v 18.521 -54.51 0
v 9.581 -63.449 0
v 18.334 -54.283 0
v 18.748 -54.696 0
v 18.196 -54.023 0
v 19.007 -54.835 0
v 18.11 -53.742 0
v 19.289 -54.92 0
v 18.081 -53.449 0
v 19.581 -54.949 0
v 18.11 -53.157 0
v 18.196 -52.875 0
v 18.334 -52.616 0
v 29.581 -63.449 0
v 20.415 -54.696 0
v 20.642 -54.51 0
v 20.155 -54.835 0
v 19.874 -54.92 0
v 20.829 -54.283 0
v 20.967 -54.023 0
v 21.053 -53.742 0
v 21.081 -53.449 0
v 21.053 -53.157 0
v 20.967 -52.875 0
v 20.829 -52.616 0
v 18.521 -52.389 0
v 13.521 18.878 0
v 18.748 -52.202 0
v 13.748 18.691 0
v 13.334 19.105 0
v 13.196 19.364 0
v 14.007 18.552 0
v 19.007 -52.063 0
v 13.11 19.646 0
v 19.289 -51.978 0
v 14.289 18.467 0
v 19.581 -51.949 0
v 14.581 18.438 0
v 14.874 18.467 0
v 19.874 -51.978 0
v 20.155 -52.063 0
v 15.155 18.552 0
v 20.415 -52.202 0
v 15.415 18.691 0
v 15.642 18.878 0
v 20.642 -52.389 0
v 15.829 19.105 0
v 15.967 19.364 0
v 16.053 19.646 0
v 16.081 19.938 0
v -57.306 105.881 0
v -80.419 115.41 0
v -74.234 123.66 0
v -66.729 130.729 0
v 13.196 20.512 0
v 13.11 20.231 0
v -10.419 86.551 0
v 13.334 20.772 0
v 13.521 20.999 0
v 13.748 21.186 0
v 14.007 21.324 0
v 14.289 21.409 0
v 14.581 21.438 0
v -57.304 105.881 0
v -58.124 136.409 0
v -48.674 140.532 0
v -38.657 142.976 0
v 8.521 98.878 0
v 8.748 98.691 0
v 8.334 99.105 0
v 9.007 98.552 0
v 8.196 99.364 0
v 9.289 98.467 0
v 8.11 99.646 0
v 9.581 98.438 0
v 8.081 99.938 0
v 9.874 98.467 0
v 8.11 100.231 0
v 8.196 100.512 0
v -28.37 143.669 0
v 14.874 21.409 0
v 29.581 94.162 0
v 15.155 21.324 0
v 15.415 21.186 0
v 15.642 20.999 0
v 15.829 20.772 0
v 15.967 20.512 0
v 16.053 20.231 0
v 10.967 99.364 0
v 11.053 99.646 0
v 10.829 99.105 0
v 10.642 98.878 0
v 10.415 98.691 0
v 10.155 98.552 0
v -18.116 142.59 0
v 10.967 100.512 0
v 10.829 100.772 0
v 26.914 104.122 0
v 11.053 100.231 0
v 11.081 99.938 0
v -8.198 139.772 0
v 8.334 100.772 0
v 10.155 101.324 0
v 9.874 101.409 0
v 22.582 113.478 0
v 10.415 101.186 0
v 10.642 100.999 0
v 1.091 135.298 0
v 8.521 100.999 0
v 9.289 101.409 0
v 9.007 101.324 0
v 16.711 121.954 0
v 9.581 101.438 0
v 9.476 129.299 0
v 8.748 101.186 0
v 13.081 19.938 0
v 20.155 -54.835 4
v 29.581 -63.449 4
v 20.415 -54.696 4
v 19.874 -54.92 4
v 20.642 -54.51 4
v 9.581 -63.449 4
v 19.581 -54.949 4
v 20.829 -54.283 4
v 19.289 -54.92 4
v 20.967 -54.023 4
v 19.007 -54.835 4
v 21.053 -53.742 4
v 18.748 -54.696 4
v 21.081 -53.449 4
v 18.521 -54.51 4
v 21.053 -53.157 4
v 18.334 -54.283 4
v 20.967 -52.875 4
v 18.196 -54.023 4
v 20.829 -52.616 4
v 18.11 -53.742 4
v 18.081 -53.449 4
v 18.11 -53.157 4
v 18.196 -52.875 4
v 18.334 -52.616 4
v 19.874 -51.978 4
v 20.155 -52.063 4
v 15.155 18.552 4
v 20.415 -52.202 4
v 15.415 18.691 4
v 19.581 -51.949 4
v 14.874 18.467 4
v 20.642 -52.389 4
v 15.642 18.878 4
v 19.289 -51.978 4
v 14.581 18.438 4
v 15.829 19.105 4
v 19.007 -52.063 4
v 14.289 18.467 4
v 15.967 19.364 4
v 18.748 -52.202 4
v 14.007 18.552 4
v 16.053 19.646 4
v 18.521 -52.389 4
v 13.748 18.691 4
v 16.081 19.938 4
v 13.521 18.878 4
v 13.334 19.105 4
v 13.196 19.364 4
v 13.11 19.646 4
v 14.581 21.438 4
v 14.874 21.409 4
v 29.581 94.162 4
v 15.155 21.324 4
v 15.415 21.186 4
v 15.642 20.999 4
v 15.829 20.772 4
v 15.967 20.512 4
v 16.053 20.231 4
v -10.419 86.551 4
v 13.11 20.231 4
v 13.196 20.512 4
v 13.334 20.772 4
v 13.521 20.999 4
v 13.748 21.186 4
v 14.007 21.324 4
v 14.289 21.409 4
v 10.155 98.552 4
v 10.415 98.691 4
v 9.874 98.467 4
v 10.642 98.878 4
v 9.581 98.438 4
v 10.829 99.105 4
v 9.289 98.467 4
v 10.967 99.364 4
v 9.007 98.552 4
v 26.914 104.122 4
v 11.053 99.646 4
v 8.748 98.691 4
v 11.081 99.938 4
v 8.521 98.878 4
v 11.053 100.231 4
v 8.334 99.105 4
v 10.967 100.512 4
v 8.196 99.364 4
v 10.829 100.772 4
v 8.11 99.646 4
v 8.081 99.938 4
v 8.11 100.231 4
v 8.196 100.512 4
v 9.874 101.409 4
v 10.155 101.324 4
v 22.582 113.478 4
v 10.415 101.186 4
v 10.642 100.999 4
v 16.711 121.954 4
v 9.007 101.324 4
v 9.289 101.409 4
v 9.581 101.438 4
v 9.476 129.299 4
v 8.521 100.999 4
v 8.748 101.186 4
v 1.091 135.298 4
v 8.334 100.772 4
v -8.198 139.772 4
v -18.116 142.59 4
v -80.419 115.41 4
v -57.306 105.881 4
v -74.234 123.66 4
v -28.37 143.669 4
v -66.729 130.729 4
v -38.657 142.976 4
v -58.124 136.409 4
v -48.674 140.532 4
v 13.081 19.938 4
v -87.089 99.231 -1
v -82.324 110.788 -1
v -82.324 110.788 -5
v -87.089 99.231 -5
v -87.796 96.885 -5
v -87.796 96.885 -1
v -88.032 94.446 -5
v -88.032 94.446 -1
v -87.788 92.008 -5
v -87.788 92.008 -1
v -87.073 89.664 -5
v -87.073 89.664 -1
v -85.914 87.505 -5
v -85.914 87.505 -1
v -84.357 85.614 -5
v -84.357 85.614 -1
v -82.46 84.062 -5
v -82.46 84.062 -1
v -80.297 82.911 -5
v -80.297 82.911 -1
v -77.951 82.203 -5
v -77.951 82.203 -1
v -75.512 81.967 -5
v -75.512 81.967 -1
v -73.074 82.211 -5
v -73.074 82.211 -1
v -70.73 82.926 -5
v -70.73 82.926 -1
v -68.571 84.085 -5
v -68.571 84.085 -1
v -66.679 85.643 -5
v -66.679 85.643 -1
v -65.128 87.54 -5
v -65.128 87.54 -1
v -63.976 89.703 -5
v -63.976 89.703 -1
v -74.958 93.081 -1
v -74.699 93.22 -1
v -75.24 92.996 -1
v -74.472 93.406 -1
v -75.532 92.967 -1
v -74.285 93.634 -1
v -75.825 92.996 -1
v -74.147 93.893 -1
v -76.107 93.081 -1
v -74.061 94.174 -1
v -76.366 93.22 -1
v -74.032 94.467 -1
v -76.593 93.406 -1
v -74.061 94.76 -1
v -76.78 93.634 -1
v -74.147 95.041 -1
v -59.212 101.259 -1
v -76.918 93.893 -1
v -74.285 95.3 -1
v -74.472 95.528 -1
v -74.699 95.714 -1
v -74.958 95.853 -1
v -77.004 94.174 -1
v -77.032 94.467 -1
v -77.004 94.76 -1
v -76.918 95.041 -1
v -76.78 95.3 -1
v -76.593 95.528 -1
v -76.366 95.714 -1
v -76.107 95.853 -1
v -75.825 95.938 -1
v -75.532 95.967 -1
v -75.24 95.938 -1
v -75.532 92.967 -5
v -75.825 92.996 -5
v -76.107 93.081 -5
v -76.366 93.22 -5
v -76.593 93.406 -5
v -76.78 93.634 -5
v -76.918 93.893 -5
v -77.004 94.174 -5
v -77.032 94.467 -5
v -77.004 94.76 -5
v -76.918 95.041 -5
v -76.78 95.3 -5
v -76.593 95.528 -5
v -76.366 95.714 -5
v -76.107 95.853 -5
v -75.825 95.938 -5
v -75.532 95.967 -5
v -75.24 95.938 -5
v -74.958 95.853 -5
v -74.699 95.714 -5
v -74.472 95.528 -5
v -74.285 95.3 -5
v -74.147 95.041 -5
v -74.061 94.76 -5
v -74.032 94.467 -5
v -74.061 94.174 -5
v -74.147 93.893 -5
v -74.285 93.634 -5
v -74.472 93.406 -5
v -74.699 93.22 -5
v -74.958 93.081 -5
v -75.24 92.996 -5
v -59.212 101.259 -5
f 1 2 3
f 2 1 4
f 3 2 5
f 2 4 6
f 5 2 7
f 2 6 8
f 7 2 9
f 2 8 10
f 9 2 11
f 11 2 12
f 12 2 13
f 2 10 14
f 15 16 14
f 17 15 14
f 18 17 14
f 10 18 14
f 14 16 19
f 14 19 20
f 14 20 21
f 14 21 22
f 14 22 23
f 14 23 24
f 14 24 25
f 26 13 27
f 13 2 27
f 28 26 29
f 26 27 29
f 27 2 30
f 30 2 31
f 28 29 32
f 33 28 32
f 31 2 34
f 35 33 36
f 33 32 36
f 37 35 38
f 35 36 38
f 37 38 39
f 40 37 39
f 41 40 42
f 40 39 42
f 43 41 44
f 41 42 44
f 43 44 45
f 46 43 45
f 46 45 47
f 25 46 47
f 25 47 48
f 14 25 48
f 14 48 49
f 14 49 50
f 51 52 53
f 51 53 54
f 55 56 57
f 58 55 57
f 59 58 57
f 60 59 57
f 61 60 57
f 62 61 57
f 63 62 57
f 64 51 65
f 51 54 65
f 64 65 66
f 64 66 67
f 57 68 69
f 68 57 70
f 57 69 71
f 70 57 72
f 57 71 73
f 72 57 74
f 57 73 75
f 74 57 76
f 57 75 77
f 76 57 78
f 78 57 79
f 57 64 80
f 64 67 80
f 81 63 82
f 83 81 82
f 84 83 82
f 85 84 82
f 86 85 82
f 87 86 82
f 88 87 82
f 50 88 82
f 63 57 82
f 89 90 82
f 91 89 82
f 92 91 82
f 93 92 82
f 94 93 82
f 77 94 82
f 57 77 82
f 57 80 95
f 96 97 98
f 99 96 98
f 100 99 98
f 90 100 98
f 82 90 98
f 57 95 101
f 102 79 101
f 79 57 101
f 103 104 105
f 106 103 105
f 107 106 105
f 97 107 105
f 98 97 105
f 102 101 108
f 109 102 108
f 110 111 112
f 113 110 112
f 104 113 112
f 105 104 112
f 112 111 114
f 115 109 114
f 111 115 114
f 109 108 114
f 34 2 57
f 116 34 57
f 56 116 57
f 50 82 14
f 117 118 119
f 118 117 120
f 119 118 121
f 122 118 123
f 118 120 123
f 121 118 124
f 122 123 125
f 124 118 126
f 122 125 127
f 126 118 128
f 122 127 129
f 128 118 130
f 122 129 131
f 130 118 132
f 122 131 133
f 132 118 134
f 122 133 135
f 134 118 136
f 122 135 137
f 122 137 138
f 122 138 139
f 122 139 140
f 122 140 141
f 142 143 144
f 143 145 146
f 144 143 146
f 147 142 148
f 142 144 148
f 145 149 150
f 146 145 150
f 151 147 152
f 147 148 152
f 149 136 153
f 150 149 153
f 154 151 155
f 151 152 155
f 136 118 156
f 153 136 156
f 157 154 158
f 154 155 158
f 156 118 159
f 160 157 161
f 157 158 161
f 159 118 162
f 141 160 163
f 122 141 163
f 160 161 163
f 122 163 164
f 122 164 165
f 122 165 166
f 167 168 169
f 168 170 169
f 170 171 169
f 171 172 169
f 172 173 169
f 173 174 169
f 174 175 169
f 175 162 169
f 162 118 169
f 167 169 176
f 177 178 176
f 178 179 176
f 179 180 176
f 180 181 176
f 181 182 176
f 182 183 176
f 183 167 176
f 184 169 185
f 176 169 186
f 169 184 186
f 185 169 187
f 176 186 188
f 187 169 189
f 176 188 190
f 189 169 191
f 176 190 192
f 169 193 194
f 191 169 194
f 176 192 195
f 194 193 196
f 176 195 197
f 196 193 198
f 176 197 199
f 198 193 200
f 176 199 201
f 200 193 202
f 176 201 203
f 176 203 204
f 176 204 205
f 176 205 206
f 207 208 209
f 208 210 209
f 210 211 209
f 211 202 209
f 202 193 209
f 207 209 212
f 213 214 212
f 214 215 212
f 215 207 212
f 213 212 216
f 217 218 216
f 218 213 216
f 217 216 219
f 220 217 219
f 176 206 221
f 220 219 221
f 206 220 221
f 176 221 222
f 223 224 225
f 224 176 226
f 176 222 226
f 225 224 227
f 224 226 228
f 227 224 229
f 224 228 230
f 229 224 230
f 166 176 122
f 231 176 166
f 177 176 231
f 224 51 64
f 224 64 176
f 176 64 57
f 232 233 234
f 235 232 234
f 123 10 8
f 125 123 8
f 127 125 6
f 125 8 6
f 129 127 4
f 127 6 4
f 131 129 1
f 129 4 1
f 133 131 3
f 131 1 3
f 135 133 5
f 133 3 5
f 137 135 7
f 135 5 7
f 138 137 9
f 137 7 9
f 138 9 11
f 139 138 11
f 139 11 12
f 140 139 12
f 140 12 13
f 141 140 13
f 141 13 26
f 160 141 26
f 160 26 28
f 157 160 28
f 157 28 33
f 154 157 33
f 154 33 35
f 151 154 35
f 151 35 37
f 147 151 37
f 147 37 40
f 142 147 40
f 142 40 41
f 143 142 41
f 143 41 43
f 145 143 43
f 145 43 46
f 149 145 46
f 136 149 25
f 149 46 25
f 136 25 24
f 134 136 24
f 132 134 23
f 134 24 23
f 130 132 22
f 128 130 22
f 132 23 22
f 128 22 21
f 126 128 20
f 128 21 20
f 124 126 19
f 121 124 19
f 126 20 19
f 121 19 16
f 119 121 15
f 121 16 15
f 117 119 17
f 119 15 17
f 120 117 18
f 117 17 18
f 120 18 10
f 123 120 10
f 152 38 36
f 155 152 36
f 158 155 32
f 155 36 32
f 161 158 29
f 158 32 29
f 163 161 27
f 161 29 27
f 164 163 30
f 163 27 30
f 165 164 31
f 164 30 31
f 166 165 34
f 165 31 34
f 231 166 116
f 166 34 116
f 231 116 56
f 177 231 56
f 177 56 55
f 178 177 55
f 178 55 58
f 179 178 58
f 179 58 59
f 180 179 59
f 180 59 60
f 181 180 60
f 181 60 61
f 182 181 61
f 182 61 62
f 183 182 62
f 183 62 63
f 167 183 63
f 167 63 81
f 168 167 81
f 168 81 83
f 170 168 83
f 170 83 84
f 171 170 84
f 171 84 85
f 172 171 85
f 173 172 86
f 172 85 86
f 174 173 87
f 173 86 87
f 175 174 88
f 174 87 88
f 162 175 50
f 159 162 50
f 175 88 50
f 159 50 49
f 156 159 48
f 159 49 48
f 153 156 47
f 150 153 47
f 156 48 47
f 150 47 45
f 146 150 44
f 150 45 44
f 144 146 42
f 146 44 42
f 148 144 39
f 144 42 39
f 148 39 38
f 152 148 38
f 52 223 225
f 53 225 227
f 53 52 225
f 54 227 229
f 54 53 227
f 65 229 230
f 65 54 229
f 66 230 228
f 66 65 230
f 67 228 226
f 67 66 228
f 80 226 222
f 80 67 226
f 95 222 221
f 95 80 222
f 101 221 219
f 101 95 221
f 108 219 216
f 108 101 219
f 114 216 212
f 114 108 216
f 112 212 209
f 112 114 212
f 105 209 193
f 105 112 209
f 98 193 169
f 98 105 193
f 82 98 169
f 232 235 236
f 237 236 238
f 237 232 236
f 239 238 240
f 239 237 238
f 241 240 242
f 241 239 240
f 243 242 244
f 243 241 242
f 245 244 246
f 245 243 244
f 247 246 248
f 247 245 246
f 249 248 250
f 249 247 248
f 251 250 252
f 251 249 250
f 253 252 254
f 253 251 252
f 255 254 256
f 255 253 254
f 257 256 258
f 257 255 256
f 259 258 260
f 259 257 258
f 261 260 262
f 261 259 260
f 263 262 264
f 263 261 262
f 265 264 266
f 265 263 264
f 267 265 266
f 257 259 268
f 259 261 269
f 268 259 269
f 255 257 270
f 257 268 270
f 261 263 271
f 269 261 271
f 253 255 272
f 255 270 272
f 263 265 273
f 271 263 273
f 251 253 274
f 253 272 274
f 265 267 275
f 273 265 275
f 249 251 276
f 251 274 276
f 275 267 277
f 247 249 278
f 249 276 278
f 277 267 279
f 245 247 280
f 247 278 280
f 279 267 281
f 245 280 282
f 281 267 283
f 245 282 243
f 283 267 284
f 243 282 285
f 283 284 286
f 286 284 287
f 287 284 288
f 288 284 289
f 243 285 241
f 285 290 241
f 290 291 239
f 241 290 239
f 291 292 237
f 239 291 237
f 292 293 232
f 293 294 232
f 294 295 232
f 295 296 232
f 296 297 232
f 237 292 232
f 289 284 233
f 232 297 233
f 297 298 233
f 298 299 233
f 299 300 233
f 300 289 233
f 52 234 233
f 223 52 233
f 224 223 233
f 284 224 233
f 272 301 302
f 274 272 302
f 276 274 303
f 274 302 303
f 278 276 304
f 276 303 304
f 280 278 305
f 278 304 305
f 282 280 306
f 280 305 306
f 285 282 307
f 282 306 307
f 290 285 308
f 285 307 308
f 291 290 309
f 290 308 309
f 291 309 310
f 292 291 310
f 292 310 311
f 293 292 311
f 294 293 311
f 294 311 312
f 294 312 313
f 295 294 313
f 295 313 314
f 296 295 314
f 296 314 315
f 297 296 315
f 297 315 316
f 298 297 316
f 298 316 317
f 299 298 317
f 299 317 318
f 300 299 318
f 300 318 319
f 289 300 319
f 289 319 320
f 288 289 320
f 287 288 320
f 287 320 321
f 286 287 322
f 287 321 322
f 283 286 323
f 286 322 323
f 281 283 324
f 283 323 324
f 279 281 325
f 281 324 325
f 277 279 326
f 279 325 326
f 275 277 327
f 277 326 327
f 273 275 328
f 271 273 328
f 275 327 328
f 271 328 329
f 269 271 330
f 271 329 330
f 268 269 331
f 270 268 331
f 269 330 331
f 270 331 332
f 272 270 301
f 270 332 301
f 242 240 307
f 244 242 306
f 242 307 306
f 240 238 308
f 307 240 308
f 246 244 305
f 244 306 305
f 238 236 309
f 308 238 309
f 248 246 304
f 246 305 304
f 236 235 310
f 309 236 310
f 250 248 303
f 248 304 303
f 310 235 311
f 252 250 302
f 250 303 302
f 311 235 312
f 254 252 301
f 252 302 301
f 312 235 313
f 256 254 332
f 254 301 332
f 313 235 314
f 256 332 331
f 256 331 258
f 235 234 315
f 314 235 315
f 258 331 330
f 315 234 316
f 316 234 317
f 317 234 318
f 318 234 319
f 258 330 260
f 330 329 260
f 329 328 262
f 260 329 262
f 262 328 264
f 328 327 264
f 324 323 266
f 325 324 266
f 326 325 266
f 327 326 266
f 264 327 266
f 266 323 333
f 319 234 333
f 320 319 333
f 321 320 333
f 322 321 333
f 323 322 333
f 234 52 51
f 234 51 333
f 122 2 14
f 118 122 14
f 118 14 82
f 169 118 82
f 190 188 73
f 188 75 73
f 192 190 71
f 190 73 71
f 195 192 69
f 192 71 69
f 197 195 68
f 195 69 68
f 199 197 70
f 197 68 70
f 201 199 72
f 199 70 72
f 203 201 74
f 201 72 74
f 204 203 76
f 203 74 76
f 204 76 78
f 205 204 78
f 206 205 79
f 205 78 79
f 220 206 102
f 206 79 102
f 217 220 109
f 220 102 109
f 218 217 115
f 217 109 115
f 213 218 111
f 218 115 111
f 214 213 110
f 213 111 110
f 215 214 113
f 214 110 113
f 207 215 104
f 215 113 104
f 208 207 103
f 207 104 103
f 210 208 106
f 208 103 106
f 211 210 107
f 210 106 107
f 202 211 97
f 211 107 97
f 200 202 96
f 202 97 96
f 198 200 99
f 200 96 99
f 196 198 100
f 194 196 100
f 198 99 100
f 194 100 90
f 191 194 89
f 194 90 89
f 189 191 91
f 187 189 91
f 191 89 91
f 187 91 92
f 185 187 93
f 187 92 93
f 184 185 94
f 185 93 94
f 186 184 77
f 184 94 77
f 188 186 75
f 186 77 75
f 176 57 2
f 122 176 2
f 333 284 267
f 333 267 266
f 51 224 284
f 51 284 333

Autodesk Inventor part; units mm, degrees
ref_plane "YZ Plane" through (0, 0, 0) normal (1, 0, 0) x (0, 1, 0)
ref_plane "XZ Plane" through (0, 0, 0) normal (0, 1, 0) x (-1, 0, 0)
ref_plane "XY Plane" through (0, 0, 0) normal (0, 0, 1) x (1, 0, 0)
sketch "Skizze1" plane through (0, 0, 0) normal (0, 0, 1) x (1, 0, 0)
  line L0 (-103.8791, 0) -> (60.3442, 0) projected
  line L1 (0, -106.7819) -> (0, 196.5471) projected
  line L2 (29.5814, -63.4492) -> (29.5814, 94.1623)
  arc A0 (29.5814, 94.1623) -> (-80.4186, 115.4104) centre (-29.4958, 83.6793) ccw
  line L3 (-80.4186, 115.4104) -> (-10.4186, 86.5508)
  line L4 (-10.4186, 86.5508) -> (9.5814, -63.4492)
  line L5 (9.5814, -63.4492) -> (29.5814, -63.4492)
  point P0 (0, 0)
  point P1 (-57.3059, 105.8815)
  dimension "d0" = 120
  dimension "d2" = 20
  dimension "d3" = 40
  dimension "d4" = 120
  dimension "d6" = 150
  dimension "d24" = 70
extrude "Extrusion1" add sketch "Skizze1" along normal blind 4 contours L4 L1 A0 L2 L0 | L0 L2 L5 L4 | L4 L3 A0 L1
sketch "Skizze2" plane through (0, 0, 4) normal (0, 0, 1) x (1, 0, 0)
  arc A0 (-82.3244, 110.7879) -> (-59.2117, 101.2589) centre (-70.768, 106.0234) ccw projected
  line L0 (29.5814, -63.4492) -> (29.5814, 94.1623) projected
  line L1 (9.5814, -63.4492) -> (29.5814, -63.4492) projected
  point P0 (0, 0)
  point P1 (19.5814, -53.4492)
  dimension "d15" = 10
  dimension "d16" = 10
hole "Bohrung1" at (19.5814, -53.4492, 4) direction (0, 0, -1) diameter 3 end through all
sketch "Skizze3" plane through (-10.4186, 86.5508, 0) normal (-0.3811568, -0.9245104, 0) x (0.9245104, -0.3811568, 0)
  line L0 (34.0793, 4) -> (-75.7158, 4) projected
  line L1 (-75.7158, 4) -> (-50.7158, 4)
  line L2 (-50.7158, 4) -> (-50.7158, -11)
  line L3 (-50.7158, -11) -> (-75.7158, -11)
  line L4 (-75.7158, -11) -> (-75.7158, 4)
  point P0 (42.6216, 0)
  dimension "d25" = 15
  dimension "d26" = 25
extrude "Extrusion2" add sketch "Skizze3" along normal blind 10
sketch "Skizze4" plane through (-80.4186, 115.4104, -11) normal (-0.9245104, 0.3811568, 0) x (0, 0, 1)
  line L0 (11, 0) -> (11, 50.0739) projected
  line L1 (0, 0) -> (0, -10) projected
  line L2 (11, 0) -> (0, 0) projected
  line L3 (11, 0) -> (15, 0) projected
  line L4 (0, -10) -> (15, -10) projected
  line L5 (11, 0) -> (6, -5)
  line L6 (15, 0) -> (15, -10) projected
  line L7 (15, 0) -> (10, -5)
  line L8 (6, -5) -> (10, -5)
  point P0 (11, -76.046)
  point P1 (11, 22.2831)
  dimension "d30" = 5
  dimension "d31" = 5
  dimension "d32" = 45
extrude "Extrusion3" cut sketch "Skizze4" against normal blind 25 contours L2 L5 L8 L7 L6 L4 L1
sketch "Skizze5" plane through (-82.3244, 110.7879, -5) normal (-0.3811568, -0.9245104, 0) x (0.9245104, -0.3811568, 0)
  point P0 (118.3373, 5)
sketch "Skizze6" plane through (-82.3244, 110.7879, -5) normal (-0.3811568, -0.9245104, 0) x (0.9245104, -0.3811568, 0)
  point P0 (118.3373, 5)
sketch "Skizze7" plane through (-82.3244, 110.7879, -5) normal (-0.3811568, -0.9245104, 0) x (0.9245104, -0.3811568, 0)
  point P0 (118.3373, 5)
sketch "Skizze8" plane through (-82.3244, 110.7879, -5) normal (-0.3811568, -0.9245104, 0) x (0.9245104, -0.3811568, 0)
  line L0 (25, 4) -> (25, 0) projected
  line L1 (0, 0) -> (25, 0)
  line L2 (25, 0) -> (25, 4)
  line L3 (25, 4) -> (0, 4)
  line L4 (0, 4) -> (0, 0)
  point P0 (118.3373, 5)
  point P1 (25, 0)
extrude "Extrusion4" add sketch "Skizze8" along normal blind 25
sketch "Skizze9" plane through (-91.8533, 87.6751, -1) normal (0, 0, 1) x (0.9245104, -0.3811568, 0)
  arc A0 (0, 12.5) -> (25, 12.5) centre (12.5, 12.5) ccw
  line L0 (0, 25) -> (0, 0) projected
  line L1 (25, 0) -> (0, 0) projected
  line L2 (25, 25) -> (25, 0) projected
  line L3 (25, 12.5) -> (25, 0)
  line L4 (0, 0) -> (0, 12.5)
  point P0 (118.3373, -46.046)
  point P1 (12.5, 0)
  dimension "d37" = 25
  dimension "d38" = 12.5
extrude "Extrusion5" cut sketch "Skizze9" against normal blind 30
sketch "Skizze10" plane through (-82.3244, 110.7879, -1) normal (0, 0, 1) x (0.9245104, -0.3811568, 0)
  arc A0 (0, -12.5) -> (25, -12.5) centre (12.5, -12.5) ccw projected
  point P0 (118.3373, -71.046)
  point P1 (12.5, -12.5)
  dimension "d41" = 0
  dimension "d42" = 0
hole "Bohrung2" at (-75.5325, 94.467, -1) direction (0, 0, -1) diameter 3 end through all
sketch "Skizze12" plane through (0, 0, 4) normal (0, 0, 1) x (1, 0, 0)
  line L0 (-57.3059, 105.8815) -> (-10.4186, 86.5508) projected
  line L1 (29.5814, -63.4492) -> (29.5814, 94.1623) projected
  point P0 (0, 0)
  point P1 (9.5814, 99.9383)
  point P2 (14.5814, 19.9383)
  dimension "d63" = 20
  dimension "d64" = 20
  dimension "d65" = 80
  dimension "d66" = 15
hole "Bohrung4" at (9.5814, 99.9383, 4) at (14.5814, 19.9383, 4) direction (0, 0, -1) diameter 3 end through all
properties part number "Halterung hinten oben"
